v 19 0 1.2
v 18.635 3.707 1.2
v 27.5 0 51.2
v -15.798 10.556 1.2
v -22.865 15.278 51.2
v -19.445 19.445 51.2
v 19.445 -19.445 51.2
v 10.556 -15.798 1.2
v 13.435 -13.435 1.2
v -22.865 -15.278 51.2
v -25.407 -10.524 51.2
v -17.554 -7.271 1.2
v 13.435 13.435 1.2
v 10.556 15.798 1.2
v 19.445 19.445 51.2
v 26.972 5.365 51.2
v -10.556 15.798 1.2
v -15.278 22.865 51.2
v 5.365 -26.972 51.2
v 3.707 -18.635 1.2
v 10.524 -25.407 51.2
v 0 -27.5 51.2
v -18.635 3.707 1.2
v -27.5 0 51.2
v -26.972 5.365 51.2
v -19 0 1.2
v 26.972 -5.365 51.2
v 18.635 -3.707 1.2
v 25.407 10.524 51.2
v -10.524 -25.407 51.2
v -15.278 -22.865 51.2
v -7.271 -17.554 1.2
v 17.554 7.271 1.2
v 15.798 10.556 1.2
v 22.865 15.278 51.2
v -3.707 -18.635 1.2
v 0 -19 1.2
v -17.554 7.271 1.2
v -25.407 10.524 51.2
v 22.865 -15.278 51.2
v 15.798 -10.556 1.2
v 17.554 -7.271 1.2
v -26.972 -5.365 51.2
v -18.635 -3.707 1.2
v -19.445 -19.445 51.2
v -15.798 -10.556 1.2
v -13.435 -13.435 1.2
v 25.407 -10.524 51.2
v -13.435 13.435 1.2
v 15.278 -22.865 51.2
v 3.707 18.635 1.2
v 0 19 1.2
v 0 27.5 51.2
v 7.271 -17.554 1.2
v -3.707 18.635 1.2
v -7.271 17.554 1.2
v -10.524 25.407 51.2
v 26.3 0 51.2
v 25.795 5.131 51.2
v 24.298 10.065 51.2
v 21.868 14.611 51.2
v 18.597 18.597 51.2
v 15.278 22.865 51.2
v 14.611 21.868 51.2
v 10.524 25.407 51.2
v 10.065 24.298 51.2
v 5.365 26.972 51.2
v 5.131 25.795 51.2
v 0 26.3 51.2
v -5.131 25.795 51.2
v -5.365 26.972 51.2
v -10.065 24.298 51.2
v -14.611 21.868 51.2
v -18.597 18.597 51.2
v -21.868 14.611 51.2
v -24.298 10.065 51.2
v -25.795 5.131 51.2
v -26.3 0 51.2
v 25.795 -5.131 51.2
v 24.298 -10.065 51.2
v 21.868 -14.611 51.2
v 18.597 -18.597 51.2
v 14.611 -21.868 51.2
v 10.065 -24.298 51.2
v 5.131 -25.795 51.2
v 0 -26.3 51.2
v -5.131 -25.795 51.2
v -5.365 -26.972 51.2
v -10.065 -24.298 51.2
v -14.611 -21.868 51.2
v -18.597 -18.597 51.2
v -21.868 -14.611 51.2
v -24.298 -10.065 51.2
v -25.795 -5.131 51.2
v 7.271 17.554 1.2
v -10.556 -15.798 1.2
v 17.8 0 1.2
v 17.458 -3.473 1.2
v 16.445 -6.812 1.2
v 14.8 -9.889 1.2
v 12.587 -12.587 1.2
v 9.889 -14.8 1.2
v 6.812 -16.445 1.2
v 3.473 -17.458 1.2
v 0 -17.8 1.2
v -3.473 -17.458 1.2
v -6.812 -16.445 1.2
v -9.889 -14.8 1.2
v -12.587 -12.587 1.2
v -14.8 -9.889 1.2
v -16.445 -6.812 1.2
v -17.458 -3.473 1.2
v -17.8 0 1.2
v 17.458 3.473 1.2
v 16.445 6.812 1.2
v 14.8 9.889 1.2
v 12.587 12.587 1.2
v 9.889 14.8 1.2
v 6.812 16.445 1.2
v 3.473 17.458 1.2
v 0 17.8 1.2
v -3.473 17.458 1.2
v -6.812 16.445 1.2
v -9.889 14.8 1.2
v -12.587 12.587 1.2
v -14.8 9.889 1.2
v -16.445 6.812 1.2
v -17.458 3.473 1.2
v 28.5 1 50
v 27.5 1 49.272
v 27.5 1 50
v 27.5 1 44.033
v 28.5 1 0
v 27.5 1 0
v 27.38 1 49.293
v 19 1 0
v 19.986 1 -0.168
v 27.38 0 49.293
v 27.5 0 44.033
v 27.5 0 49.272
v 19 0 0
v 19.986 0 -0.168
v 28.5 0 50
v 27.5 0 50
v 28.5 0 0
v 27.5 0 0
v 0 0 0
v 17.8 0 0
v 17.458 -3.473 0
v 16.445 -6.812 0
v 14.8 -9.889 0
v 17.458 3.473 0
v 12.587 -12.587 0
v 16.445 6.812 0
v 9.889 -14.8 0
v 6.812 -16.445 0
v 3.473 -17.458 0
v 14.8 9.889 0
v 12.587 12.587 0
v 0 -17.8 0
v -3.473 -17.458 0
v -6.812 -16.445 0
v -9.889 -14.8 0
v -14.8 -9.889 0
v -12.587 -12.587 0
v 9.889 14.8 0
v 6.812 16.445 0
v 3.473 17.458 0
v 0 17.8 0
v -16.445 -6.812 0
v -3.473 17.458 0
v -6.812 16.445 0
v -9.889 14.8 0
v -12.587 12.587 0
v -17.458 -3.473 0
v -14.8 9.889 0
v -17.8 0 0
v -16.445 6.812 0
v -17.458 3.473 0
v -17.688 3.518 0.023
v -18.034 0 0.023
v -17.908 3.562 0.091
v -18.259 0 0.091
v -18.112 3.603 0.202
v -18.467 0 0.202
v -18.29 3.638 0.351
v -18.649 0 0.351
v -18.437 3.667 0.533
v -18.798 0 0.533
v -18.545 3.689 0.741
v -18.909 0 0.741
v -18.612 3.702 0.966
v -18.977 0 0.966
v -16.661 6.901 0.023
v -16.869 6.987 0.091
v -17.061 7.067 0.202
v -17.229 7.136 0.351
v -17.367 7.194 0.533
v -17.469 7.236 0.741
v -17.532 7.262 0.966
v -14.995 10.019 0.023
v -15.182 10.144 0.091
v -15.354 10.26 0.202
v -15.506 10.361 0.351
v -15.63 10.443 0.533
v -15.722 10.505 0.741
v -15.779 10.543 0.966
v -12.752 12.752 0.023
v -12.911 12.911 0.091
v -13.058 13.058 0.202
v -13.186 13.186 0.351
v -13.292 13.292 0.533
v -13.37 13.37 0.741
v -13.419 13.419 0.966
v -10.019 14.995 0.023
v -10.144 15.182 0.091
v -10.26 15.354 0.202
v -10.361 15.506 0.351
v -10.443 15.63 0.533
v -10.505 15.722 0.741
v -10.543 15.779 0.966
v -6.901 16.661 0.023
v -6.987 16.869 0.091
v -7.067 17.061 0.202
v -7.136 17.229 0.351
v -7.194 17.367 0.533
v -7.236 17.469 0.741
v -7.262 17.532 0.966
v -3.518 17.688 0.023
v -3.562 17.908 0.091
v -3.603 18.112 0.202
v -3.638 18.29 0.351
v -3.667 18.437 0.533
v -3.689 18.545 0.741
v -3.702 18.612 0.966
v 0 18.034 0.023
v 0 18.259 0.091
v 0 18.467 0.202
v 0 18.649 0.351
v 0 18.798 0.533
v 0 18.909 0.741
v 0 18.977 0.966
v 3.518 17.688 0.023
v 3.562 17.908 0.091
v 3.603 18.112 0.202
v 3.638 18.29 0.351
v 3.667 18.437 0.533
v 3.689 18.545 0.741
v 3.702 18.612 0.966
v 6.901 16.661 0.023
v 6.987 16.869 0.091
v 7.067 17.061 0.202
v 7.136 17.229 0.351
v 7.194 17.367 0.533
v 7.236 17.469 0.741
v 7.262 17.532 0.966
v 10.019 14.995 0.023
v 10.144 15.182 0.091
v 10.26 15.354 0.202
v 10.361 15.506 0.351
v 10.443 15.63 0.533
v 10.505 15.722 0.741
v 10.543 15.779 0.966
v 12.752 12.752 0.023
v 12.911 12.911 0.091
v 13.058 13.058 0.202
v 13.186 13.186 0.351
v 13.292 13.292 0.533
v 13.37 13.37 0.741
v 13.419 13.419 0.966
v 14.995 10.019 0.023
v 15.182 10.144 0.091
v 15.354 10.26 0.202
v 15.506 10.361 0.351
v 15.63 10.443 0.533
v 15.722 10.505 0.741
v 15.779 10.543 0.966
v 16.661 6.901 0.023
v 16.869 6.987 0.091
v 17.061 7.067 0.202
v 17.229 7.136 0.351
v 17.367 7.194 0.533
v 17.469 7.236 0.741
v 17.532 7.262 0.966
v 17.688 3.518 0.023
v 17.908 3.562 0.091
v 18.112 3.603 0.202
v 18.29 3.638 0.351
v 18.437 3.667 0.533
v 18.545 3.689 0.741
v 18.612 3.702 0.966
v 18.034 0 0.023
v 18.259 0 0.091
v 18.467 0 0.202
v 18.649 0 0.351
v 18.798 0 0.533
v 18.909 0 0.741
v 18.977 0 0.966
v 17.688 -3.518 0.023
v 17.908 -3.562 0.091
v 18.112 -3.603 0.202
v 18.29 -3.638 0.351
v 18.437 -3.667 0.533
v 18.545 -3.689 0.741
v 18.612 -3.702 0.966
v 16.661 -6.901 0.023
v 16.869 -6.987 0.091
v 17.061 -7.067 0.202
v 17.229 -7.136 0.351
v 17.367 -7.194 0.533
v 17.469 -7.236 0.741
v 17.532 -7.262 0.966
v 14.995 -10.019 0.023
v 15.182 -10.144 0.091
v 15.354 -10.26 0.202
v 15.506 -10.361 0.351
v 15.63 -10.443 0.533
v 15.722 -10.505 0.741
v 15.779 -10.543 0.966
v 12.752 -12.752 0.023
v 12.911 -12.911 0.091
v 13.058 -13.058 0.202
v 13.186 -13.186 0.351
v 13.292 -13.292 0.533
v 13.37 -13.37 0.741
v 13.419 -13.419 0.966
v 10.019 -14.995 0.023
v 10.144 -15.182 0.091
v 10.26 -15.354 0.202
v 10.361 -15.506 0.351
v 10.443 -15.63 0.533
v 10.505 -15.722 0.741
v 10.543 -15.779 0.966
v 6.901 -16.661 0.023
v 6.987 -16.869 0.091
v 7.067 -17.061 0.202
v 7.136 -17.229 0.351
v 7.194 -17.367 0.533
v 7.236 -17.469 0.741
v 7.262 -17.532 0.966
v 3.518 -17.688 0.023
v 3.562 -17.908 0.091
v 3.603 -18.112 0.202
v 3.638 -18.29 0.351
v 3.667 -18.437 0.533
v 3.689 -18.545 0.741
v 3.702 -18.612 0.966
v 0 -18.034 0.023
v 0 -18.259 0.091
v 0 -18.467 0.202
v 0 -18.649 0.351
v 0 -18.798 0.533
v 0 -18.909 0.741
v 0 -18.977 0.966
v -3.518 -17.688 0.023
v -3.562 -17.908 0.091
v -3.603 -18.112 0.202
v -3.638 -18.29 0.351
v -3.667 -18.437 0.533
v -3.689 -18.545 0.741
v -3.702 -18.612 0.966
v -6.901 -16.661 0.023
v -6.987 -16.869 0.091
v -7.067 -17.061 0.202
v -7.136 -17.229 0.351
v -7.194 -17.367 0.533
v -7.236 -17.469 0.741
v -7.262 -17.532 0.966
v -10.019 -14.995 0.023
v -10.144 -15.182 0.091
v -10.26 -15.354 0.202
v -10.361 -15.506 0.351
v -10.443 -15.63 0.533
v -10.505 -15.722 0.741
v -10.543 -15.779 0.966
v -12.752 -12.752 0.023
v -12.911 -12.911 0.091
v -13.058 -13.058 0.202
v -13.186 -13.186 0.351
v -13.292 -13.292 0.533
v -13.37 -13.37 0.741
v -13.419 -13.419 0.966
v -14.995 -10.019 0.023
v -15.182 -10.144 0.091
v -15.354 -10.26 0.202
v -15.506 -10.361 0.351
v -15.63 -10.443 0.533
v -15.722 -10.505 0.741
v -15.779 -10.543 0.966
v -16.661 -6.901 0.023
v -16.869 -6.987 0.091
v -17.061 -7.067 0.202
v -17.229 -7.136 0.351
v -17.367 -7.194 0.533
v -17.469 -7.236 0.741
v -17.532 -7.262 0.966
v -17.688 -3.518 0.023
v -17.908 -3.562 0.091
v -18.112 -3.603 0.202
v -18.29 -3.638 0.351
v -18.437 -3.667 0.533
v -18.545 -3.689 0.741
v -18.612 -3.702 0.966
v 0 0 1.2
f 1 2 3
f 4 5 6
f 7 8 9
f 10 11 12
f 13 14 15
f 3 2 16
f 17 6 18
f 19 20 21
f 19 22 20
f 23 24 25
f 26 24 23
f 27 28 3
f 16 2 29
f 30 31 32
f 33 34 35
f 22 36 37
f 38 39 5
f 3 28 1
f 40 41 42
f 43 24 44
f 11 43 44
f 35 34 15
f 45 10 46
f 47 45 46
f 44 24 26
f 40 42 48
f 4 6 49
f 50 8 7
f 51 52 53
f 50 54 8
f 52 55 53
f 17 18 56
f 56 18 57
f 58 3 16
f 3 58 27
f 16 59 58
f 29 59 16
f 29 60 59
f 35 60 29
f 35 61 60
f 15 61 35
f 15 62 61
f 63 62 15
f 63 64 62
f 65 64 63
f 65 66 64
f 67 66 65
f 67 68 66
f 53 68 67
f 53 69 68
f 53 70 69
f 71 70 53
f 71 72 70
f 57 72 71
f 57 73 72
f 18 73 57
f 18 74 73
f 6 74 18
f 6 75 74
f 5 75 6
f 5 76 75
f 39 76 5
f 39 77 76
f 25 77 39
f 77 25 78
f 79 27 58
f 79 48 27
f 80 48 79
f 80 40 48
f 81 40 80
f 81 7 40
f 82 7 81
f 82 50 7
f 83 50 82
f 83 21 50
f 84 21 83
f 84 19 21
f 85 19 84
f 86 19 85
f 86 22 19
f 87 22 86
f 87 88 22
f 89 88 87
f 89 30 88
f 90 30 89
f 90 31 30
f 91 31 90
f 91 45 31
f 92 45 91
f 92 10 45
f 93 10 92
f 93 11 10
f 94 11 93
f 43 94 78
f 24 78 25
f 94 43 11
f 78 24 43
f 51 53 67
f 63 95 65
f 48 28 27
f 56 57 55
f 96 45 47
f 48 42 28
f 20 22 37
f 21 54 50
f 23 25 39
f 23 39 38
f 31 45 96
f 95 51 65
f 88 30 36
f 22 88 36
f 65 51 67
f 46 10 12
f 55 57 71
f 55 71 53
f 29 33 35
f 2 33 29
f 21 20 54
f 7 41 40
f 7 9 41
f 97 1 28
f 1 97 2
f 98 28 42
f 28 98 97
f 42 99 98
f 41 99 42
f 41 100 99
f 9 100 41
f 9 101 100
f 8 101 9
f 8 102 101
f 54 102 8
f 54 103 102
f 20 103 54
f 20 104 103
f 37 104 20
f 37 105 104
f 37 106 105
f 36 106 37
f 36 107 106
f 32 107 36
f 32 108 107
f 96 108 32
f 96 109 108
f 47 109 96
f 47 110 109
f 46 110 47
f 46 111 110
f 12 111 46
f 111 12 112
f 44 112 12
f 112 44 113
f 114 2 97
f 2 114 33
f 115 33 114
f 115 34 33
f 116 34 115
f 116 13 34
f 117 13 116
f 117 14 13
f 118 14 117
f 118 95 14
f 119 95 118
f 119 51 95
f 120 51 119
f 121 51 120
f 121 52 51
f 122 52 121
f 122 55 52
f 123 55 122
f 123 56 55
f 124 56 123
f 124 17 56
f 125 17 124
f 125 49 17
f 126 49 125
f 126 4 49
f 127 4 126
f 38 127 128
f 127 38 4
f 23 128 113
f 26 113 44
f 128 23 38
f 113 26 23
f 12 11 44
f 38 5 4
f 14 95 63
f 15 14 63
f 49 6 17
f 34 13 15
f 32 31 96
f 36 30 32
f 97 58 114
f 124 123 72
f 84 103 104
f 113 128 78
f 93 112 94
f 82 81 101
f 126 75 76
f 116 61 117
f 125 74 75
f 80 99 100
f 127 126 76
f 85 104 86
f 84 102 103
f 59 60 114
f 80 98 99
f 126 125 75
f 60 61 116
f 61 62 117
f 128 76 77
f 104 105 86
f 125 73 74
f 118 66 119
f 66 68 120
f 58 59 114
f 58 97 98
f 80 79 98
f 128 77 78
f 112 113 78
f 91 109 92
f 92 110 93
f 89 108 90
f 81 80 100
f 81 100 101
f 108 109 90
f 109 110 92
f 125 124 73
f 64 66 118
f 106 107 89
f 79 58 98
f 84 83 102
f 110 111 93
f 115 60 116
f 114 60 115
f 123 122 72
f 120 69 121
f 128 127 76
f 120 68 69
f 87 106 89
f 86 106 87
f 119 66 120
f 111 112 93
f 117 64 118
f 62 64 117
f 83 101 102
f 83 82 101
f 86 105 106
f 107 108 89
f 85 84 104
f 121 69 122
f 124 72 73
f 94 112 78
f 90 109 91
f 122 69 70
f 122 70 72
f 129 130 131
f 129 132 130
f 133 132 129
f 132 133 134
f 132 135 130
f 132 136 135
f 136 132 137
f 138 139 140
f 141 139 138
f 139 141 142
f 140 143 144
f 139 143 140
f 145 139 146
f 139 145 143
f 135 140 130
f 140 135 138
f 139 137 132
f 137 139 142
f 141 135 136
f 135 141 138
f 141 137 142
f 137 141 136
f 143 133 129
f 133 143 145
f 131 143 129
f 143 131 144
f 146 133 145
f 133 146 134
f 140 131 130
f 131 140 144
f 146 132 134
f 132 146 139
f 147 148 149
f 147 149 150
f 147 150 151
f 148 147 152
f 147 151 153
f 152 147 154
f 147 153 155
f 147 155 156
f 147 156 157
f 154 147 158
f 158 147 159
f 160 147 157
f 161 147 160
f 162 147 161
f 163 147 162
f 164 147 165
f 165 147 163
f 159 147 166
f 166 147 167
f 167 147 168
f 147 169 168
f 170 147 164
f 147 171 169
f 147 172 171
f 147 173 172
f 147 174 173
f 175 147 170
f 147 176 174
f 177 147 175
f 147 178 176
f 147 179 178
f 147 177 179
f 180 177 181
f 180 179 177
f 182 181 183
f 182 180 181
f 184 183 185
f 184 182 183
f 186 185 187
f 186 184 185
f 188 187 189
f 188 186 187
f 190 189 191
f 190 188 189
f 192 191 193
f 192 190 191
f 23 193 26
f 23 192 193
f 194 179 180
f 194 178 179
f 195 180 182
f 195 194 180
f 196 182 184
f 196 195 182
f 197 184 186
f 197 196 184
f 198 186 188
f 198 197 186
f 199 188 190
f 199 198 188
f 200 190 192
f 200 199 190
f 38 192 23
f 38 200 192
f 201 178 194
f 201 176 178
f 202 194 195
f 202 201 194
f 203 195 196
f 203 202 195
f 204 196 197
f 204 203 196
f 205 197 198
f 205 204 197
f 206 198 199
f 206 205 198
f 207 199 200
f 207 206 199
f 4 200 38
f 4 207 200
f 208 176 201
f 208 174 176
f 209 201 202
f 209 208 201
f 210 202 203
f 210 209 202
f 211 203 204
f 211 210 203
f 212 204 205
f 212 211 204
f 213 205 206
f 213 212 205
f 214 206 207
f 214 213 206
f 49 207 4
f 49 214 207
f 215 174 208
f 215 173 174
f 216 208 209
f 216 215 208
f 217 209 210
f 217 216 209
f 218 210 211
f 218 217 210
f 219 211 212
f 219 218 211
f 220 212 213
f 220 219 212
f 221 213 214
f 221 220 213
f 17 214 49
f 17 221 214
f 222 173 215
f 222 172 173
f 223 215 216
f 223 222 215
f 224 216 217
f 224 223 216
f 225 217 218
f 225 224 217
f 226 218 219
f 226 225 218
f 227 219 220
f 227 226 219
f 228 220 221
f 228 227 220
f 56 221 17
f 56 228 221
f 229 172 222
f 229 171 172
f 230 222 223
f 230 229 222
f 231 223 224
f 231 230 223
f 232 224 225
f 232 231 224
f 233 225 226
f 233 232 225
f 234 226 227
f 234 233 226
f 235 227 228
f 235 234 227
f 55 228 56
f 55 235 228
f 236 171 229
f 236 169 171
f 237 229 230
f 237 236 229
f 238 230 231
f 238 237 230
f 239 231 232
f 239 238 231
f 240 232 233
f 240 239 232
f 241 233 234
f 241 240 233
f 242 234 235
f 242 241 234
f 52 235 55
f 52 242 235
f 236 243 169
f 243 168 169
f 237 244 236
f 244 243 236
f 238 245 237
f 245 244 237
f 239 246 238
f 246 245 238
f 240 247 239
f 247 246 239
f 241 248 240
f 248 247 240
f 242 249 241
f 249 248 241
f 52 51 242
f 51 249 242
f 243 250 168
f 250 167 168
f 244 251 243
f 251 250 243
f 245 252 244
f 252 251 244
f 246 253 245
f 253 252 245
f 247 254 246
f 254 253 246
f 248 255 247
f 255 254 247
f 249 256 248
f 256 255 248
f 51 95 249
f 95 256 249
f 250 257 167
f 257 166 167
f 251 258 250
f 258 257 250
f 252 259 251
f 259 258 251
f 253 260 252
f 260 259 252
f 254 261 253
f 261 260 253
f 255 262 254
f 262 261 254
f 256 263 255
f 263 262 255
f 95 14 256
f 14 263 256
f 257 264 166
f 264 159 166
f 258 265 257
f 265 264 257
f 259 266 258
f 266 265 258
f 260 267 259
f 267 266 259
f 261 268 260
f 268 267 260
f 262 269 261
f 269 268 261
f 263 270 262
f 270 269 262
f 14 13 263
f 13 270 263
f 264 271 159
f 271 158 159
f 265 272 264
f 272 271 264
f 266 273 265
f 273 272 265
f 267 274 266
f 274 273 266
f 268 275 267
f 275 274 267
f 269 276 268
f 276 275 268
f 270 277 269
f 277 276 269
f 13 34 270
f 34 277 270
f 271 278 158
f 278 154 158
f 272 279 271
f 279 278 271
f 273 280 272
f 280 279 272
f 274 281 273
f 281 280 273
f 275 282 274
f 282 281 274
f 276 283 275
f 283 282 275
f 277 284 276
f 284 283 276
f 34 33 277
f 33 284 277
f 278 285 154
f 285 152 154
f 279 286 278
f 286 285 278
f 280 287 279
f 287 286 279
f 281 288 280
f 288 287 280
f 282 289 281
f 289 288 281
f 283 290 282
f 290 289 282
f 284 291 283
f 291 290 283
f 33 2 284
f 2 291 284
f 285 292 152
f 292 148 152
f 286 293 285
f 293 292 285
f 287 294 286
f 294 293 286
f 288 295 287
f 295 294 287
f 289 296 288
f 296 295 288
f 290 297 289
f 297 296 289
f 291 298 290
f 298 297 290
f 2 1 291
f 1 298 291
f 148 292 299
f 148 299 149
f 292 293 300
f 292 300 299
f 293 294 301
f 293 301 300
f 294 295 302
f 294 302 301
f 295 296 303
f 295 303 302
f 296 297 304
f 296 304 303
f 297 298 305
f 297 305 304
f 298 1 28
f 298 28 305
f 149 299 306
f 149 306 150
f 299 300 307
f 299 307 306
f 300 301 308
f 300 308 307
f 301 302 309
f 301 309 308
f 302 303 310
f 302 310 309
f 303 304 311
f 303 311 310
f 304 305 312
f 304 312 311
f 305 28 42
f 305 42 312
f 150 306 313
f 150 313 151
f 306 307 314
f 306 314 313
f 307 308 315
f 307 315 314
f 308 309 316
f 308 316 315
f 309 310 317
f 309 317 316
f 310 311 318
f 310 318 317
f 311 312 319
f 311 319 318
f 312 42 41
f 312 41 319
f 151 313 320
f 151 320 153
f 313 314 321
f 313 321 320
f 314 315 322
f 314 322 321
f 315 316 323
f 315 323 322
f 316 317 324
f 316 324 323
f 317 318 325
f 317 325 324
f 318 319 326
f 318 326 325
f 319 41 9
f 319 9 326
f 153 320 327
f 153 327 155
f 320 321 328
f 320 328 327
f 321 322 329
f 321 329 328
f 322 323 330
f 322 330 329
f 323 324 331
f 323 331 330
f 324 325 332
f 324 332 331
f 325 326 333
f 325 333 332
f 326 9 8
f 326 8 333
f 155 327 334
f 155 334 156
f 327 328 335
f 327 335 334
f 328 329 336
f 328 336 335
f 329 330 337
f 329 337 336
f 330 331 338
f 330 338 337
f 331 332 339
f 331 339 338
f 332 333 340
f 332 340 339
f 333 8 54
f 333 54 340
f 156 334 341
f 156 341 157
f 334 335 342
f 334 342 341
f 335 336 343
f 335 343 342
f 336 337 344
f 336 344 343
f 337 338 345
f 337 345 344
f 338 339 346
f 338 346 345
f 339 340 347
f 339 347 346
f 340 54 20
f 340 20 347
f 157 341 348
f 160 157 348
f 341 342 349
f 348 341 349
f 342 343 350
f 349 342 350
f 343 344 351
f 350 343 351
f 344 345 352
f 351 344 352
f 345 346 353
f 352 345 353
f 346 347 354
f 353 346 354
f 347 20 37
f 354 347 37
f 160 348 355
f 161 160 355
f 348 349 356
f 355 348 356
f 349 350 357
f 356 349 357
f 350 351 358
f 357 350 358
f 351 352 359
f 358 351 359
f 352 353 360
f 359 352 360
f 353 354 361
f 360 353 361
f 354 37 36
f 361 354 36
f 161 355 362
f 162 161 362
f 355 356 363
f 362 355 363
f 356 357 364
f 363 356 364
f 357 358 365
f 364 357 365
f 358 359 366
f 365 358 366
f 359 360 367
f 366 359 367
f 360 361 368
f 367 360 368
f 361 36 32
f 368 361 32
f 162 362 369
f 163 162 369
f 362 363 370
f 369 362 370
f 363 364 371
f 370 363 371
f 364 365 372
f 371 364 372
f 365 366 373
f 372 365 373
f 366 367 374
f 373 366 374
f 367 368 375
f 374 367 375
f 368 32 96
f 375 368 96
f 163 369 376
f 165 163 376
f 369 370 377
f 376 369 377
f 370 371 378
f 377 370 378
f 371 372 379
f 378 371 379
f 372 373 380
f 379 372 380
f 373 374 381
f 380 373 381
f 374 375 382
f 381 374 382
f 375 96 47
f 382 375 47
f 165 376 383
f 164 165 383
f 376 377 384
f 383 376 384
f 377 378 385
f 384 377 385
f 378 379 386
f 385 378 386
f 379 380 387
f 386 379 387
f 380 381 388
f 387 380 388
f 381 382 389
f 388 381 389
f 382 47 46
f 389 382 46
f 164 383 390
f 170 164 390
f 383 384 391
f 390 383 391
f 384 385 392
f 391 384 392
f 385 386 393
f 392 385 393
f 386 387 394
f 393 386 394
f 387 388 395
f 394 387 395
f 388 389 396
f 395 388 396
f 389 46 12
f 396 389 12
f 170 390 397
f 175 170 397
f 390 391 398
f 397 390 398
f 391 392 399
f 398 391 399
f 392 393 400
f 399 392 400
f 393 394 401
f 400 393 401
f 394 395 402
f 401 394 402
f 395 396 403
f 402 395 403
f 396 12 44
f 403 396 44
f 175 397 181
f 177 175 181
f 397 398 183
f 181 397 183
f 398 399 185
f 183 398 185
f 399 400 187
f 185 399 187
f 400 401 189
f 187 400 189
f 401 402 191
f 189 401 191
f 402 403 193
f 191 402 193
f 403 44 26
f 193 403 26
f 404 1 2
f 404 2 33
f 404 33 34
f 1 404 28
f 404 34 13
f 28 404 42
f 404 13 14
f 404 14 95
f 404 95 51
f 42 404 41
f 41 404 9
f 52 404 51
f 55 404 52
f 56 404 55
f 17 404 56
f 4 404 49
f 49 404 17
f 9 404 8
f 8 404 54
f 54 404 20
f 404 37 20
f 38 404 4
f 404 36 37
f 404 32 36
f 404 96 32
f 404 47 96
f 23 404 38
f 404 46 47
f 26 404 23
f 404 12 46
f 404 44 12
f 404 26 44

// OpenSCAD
use <../plant-pot.scad>;

num_sides = 32; // number of points for the polygon

body_thickness = 1.2;
body_height = 50;

upper_dia = 54 + 1;
lower_dia = 38;

collar_diameter = 100;
collar_height = 53;

ivw = false;
slots = true;
lines = true;

if (ivw)
{
    ivw_thickness = body_thickness / 2;                   // half of the body thickness
    ivw_width = (lower_dia - body_thickness * 2) / 2 / 3; // 1/3 of the inner lower radius
    ivw_height = body_height * 0.8;                       // 80% of the body height

    plant_pot(body_height = body_height, body_thickness = body_thickness, upper_outer_diameter = upper_dia,
              lower_outer_diameter = lower_dia, ivw_thickness = ivw_thickness, ivw_width = ivw_width,
              ivw_height = ivw_height, pos_ivw = ivw, neg_ivw = slots, collar_height = collar_height,
              collar_diameter = collar_diameter, sides = num_sides, showlines = lines);
}
else
{
    plant_pot(body_height = body_height, body_thickness = body_thickness, upper_outer_diameter = upper_dia,
              lower_outer_diameter = lower_dia, showlines = lines);
}
